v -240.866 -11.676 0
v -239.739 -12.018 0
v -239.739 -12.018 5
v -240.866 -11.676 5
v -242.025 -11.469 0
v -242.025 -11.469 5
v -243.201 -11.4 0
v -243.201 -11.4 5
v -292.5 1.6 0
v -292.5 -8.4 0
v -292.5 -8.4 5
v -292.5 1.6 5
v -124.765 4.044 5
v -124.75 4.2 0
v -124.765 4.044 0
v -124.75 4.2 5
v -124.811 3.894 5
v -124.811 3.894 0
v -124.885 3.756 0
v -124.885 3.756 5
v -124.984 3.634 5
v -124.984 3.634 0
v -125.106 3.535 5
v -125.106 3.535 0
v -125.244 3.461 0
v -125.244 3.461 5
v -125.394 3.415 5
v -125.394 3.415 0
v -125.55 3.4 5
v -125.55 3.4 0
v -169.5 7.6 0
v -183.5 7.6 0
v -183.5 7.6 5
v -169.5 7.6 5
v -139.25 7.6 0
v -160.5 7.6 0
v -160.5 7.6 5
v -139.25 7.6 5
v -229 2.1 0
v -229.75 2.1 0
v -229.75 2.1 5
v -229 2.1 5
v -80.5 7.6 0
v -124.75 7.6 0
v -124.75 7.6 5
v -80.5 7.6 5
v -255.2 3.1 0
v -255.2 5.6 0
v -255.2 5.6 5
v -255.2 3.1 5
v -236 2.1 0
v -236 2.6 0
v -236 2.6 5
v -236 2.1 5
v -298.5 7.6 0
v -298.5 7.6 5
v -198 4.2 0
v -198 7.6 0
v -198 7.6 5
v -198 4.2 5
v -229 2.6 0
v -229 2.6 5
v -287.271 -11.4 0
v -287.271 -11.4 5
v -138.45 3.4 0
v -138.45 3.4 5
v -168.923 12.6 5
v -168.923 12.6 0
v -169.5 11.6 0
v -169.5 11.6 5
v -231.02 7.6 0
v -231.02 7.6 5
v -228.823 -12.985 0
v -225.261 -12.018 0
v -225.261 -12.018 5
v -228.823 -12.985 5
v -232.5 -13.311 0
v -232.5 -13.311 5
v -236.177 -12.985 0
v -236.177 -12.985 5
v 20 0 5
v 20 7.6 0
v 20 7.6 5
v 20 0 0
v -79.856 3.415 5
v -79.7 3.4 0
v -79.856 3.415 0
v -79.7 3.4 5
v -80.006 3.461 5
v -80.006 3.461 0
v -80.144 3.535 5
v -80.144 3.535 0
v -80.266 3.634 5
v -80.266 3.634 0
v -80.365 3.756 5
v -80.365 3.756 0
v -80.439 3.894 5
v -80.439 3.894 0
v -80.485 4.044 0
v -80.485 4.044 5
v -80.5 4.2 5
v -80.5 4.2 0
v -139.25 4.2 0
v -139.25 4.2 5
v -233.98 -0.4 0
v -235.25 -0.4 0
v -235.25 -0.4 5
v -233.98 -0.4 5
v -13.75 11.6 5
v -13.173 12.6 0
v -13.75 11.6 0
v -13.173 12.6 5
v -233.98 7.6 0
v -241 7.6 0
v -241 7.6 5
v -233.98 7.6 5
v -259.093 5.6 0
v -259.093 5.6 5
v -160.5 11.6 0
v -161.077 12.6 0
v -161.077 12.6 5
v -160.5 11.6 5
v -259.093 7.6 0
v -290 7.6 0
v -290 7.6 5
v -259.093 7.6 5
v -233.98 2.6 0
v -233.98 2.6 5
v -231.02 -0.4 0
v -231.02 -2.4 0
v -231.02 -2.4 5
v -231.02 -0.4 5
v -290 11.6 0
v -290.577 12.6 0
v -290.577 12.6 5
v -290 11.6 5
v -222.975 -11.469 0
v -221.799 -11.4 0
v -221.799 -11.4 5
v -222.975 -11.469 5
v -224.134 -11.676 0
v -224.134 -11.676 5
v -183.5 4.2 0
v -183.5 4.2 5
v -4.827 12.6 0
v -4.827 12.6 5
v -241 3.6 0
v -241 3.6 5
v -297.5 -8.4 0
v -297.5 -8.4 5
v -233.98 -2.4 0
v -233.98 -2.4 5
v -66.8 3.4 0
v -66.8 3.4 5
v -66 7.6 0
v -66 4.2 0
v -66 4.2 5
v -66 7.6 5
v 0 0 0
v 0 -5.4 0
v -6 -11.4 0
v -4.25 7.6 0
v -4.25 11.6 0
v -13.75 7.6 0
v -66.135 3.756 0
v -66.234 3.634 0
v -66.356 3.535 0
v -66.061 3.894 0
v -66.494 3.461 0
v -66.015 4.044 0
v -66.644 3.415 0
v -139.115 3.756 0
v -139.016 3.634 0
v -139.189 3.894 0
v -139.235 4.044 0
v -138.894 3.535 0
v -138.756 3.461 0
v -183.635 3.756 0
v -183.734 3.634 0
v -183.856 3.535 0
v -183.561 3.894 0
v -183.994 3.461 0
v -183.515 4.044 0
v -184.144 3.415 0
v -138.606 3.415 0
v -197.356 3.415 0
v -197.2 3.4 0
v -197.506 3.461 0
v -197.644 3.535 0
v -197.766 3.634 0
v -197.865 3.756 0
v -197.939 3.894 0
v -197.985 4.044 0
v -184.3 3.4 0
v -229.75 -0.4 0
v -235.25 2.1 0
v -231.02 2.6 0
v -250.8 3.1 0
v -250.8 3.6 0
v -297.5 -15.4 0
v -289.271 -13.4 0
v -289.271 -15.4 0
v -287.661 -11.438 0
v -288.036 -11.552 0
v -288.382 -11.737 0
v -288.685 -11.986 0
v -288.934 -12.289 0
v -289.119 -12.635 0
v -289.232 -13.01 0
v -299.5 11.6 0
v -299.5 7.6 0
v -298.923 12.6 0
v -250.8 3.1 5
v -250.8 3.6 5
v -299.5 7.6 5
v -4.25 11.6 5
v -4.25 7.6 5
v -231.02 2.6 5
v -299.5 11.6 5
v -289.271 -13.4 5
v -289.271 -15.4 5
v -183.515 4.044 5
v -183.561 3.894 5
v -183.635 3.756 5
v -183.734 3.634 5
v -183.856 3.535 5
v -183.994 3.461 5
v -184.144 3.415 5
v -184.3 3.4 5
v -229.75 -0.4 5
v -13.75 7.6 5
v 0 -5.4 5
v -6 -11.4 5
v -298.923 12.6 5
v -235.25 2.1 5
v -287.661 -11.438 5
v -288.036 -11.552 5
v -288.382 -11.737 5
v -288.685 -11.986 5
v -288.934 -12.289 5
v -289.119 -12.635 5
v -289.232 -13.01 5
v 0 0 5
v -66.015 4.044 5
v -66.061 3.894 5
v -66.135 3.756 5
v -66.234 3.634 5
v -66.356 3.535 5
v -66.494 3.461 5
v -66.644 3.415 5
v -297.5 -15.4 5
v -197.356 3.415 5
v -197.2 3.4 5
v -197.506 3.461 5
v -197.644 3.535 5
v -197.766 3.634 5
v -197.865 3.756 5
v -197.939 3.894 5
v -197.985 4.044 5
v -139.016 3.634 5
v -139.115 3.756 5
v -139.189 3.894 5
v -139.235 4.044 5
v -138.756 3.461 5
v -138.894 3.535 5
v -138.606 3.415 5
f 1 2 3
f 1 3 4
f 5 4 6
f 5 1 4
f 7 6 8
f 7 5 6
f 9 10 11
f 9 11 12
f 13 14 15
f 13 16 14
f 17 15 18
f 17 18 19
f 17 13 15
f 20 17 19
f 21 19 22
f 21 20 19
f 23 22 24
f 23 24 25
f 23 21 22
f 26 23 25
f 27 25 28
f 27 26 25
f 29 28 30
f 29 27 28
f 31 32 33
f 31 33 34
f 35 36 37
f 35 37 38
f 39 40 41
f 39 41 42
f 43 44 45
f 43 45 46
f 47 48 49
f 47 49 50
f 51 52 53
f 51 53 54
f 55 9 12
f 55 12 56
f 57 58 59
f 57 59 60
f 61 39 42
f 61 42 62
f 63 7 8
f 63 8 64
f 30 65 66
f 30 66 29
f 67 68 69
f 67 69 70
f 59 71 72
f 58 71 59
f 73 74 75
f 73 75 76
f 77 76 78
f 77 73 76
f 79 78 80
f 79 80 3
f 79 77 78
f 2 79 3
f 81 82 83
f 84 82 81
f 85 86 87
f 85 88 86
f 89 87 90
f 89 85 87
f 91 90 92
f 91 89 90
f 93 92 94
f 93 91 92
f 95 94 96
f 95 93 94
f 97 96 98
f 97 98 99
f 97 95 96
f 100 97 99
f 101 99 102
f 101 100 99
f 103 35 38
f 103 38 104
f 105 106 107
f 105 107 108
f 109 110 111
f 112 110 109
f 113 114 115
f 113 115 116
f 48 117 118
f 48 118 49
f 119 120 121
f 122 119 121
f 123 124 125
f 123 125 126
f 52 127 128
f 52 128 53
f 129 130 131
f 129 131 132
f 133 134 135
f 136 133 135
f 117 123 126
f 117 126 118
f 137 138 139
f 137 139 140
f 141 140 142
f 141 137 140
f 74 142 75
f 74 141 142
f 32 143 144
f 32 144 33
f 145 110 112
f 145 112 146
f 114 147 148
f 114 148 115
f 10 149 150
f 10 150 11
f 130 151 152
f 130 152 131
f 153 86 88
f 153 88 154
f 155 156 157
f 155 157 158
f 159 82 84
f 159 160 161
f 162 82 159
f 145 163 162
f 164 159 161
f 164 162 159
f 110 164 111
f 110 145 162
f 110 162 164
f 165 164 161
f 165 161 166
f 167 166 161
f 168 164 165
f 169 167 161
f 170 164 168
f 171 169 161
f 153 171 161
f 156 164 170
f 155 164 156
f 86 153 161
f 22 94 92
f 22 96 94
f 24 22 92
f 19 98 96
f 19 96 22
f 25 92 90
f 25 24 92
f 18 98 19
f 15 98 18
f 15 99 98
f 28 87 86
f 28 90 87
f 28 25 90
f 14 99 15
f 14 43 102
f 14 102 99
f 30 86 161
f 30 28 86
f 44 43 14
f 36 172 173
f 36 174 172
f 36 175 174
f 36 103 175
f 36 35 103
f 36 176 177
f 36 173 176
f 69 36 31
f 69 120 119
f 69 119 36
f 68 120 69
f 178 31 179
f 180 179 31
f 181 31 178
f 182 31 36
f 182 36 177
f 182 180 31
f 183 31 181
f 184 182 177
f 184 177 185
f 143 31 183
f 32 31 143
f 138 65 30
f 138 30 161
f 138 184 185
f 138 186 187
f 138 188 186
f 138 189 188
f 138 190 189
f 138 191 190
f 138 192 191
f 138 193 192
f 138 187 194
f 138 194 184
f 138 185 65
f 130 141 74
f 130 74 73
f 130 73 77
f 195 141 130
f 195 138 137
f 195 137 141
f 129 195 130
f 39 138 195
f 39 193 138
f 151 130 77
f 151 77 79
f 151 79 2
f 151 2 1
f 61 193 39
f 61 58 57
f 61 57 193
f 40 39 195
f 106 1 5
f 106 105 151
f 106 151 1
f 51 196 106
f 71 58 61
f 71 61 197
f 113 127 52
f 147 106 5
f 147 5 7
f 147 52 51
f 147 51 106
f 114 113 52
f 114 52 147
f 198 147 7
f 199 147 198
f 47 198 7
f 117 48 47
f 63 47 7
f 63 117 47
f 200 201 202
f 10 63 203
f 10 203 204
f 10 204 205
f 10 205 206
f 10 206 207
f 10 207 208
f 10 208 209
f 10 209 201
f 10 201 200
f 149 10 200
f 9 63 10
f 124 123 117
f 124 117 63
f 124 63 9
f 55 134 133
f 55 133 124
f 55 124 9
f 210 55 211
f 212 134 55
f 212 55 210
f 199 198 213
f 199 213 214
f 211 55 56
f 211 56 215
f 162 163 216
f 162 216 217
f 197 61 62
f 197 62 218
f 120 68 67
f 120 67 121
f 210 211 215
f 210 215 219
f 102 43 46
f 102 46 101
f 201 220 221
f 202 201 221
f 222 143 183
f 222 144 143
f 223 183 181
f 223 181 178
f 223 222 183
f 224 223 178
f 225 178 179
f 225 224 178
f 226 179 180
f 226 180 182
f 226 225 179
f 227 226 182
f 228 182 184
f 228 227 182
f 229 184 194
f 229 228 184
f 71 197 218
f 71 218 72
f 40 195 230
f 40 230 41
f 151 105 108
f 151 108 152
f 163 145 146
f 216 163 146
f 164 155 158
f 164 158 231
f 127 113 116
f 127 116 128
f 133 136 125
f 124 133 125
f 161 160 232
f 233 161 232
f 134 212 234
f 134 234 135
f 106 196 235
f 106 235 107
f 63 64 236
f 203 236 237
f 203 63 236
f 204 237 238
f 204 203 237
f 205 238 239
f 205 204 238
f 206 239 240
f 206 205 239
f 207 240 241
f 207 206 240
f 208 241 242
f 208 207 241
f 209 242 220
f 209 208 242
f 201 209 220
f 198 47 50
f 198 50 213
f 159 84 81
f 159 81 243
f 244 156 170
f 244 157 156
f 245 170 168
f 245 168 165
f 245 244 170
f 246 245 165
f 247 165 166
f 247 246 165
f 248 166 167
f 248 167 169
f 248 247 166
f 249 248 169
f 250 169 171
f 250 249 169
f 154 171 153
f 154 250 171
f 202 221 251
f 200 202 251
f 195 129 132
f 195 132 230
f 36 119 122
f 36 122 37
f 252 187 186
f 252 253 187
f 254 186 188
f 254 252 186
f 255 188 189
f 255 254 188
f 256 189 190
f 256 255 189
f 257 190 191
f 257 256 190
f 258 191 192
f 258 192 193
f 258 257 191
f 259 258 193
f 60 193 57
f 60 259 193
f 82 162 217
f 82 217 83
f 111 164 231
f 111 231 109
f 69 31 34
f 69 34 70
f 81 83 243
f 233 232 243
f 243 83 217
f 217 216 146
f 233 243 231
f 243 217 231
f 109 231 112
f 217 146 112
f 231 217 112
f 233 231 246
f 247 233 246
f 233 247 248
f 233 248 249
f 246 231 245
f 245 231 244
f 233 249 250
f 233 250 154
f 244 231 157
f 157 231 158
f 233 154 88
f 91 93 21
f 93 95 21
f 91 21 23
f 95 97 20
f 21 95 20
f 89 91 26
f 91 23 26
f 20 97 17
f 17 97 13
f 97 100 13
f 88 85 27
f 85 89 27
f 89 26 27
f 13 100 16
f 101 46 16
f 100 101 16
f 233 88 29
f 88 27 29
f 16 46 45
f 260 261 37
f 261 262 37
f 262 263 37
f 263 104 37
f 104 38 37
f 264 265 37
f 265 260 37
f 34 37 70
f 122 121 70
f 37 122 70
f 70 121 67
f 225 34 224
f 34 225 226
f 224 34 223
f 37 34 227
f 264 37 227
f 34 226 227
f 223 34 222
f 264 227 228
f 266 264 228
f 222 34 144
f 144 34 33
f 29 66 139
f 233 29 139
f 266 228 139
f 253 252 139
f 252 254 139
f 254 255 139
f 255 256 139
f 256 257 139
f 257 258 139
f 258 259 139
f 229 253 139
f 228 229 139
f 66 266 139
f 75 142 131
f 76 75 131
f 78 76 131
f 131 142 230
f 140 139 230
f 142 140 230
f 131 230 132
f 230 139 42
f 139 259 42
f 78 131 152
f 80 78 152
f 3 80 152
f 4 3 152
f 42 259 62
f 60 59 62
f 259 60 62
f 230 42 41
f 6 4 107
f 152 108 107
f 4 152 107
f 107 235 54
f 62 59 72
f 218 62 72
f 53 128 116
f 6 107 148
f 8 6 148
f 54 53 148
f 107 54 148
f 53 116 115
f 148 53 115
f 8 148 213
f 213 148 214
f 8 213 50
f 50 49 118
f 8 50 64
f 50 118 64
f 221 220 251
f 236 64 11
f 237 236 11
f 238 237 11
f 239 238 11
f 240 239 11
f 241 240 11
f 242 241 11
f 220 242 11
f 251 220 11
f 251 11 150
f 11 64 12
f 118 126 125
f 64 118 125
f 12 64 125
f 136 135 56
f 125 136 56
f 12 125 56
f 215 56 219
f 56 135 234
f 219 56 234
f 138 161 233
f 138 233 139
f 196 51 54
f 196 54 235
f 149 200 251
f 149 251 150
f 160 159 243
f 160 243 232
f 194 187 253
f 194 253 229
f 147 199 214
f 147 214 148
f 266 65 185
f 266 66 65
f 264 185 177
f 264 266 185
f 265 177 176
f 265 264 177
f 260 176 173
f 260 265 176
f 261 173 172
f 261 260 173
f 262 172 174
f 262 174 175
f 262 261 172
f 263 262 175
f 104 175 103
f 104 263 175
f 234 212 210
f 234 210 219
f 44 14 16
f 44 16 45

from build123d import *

# Parameters (mm, degrees)
BOSS_EXTRUDE1_DEPTH   = 5
CHAMFER1_SIZE         = 6
CUT_EXTRUDE2_DEPTH    = 6
CHAMFER3_SIZE         = 1
CHAMFER3_SIZE2        = 0.577350269
CHAMFER3_PART_2_SIZE  = 1
CHAMFER3_PART_2_SIZE2 = 0.577350269
CHAMFER3_PART_3_SIZE  = 1
CHAMFER3_PART_3_SIZE2 = 0.577350269
CHAMFER4_SIZE         = 1
CHAMFER4_SIZE2        = 0.577350269
CHAMFER4_PART_2_SIZE  = 1
CHAMFER4_PART_2_SIZE2 = 0.577350269
CHAMFER4_PART_3_SIZE  = 1
CHAMFER4_PART_3_SIZE2 = 0.577350269
FILLET1_R             = 0.8


with BuildPart() as part:
    # Sketch1 → Boss-Extrude1 (new body)
    with BuildSketch(Plane.XY):
        with BuildLine():
            Line((-250.8, 3.6), (-241, 3.6))
            Line((-241, 3.6), (-241, 7.6))
            Line((-241, 7.6), (-233.98, 7.6))
            Line((-233.98, 7.6), (-233.98, 2.6))
            Line((-233.98, 2.6), (-236, 2.6))
            Line((-236, 2.6), (-236, 2.1))
            Line((-236, 2.1), (-235.25, 2.1))
            Line((-235.25, 2.1), (-235.25, -0.4))
            Line((-235.25, -0.4), (-233.98, -0.4))
            Line((-233.98, -0.4), (-233.98, -2.4))
            Line((-233.98, -2.4), (-231.02, -2.4))
            Line((-231.02, -2.4), (-231.02, -0.4))
            Line((-231.02, -0.4), (-229.75, -0.4))
            Line((-229.75, -0.4), (-229.75, 2.1))
            Line((-229.75, 2.1), (-229, 2.1))
            Line((-229, 2.1), (-229, 2.6))
            Line((-229, 2.6), (-231.02, 2.6))
            Line((-231.02, 2.6), (-231.02, 7.6))
            Line((-231.02, 7.6), (-198, 7.6))
            Line((-198, 7.6), (-198, 3.4))
            Line((-198, 3.4), (-183.5, 3.4))
            Line((-183.5, 3.4), (-183.5, 7.6))
            Line((-183.5, 7.6), (-169.5, 7.6))
            Line((-169.5, 7.6), (-169.5, 12.6))
            Line((-169.5, 12.6), (-160.5, 12.6))
            Line((-160.5, 12.6), (-160.5, 7.6))
            Line((-160.5, 7.6), (-139.25, 7.6))
            Line((-139.25, 7.6), (-139.25, 3.4))
            Line((-139.25, 3.4), (-124.75, 3.4))
            Line((-124.75, 3.4), (-124.75, 7.6))
            Line((-124.75, 7.6), (-80.5, 7.6))
            Line((-80.5, 7.6), (-80.5, 3.4))
            Line((-80.5, 3.4), (-66, 3.4))
            Line((-66, 3.4), (-66, 7.6))
            Line((-66, 7.6), (-13.75, 7.6))
            Line((-13.75, 7.6), (-13.75, 12.6))
            Line((-13.75, 12.6), (-4.25, 12.6))
            Line((-4.25, 12.6), (-4.25, 7.6))
            Line((-4.25, 7.6), (20, 7.6))
            Line((20, 7.6), (20, 0))
            Line((20, 0), (0, 0))
            Line((0, 0), (0, -11.4))
            Line((0, -11.4), (-221.799463771, -11.4))
            ThreePointArc((-221.799463771, -11.4), (-223.557706142, -11.555784248), (-225.261167219, -12.018283247))
            ThreePointArc((-225.261167219, -12.018283247), (-232.5, -13.3111869), (-239.738832781, -12.018283247))
            ThreePointArc((-239.738832781, -12.018283247), (-241.442293858, -11.555784248), (-243.200536229, -11.4))
            Line((-243.200536229, -11.4), (-287.270831989, -11.4))
            ThreePointArc((-287.270831989, -11.4), (-289.270831989, -13.4), (-287.270831989, -15.4))
            Line((-287.270831989, -15.4), (-282, -15.4))
            Line((-282, -15.4), (-282, -18.281197846))
            Line((-282, -18.281197846), (-283, -20.013248654))
            Line((-283, -20.013248654), (-286, -18.281197846))
            Line((-286, -18.281197846), (-290, -20.590598923))
            Line((-290, -20.590598923), (-290, -25.209401077))
            Line((-290, -25.209401077), (-286, -27.518802154))
            Line((-286, -27.518802154), (-283, -25.786751346))
            Line((-283, -25.786751346), (-282, -27.518802154))
            Line((-282, -27.518802154), (-282, -30.9))
            Line((-282, -30.9), (-297.5, -30.9))
            Line((-297.5, -30.9), (-297.5, -8.4))
            Line((-297.5, -8.4), (-292.5, -8.4))
            Line((-292.5, -8.4), (-292.5, 1.6))
            Line((-292.5, 1.6), (-298.5, 7.6))
            Line((-298.5, 7.6), (-299.5, 7.6))
            Line((-299.5, 7.6), (-299.5, 12.6))
            Line((-299.5, 12.6), (-290, 12.6))
            Line((-290, 12.6), (-290, 7.6))
            Line((-290, 7.6), (-259.093151184, 7.6))
            Line((-259.093151184, 7.6), (-259.093151184, 5.6))
            Line((-259.093151184, 5.6), (-255.2, 5.6))
            Line((-255.2, 5.6), (-255.2, 3.1))
            Line((-255.2, 3.1), (-250.8, 3.1))
            Line((-250.8, 3.1), (-250.8, 3.6))
        make_face()
    extrude(amount=BOSS_EXTRUDE1_DEPTH)

    # Chamfer1
    chamfer1_edges = [part.edges().sort_by_distance(p)[0] for p in [
        (0, -11.4, 2.5),
    ]]
    chamfer(chamfer1_edges, length=CHAMFER1_SIZE)

    # Sketch3 → Cut-Extrude2 (cut, through all)
    with BuildSketch(Plane.XY.offset(5)):
        Polygon((-289.270831989, -13.4), (-289.270831989, -15.4), (-297.5, -15.4), (-297.5, -30.9), (-282, -30.9), (-282, -13.4), align=None)
    extrude(amount=-CUT_EXTRUDE2_DEPTH, mode=Mode.SUBTRACT)

    # Chamfer3
    chamfer3_edges = [part.edges().sort_by_distance(p)[0] for p in [
        (-290, 12.6, 2.5),
    ]]
    chamfer3_side = [part.faces().sort_by_distance(p)[0] for p in [
        (-290, 10.1, 2.5),
    ]]
    chamfer(chamfer3_edges, length=CHAMFER3_SIZE, length2=CHAMFER3_SIZE2, reference=chamfer3_side[0])

    # Chamfer3 part 2
    chamfer3_part_2_edges = [part.edges().sort_by_distance(p)[0] for p in [
        (-160.5, 12.6, 2.5),
    ]]
    chamfer3_part_2_side = [part.faces().sort_by_distance(p)[0] for p in [
        (-160.5, 10.1, 2.5),
    ]]
    chamfer(chamfer3_part_2_edges, length=CHAMFER3_PART_2_SIZE, length2=CHAMFER3_PART_2_SIZE2, reference=chamfer3_part_2_side[0])

    # Chamfer3 part 3
    chamfer3_part_3_edges = [part.edges().sort_by_distance(p)[0] for p in [
        (-4.25, 12.6, 2.5),
    ]]
    chamfer3_part_3_side = [part.faces().sort_by_distance(p)[0] for p in [
        (-4.25, 10.1, 2.5),
    ]]
    chamfer(chamfer3_part_3_edges, length=CHAMFER3_PART_3_SIZE, length2=CHAMFER3_PART_3_SIZE2, reference=chamfer3_part_3_side[0])

    # Chamfer4
    chamfer4_edges = [part.edges().sort_by_distance(p)[0] for p in [
        (-299.5, 12.6, 2.5),
    ]]
    chamfer4_side = [part.faces().sort_by_distance(p)[0] for p in [
        (-299.5, 10.1, 2.5),
    ]]
    chamfer(chamfer4_edges, length=CHAMFER4_SIZE, length2=CHAMFER4_SIZE2, reference=chamfer4_side[0])

    # Chamfer4 part 2
    chamfer4_part_2_edges = [part.edges().sort_by_distance(p)[0] for p in [
        (-169.5, 12.6, 2.5),
    ]]
    chamfer4_part_2_side = [part.faces().sort_by_distance(p)[0] for p in [
        (-169.5, 10.1, 2.5),
    ]]
    chamfer(chamfer4_part_2_edges, length=CHAMFER4_PART_2_SIZE, length2=CHAMFER4_PART_2_SIZE2, reference=chamfer4_part_2_side[0])

    # Chamfer4 part 3
    chamfer4_part_3_edges = [part.edges().sort_by_distance(p)[0] for p in [
        (-13.75, 12.6, 2.5),
    ]]
    chamfer4_part_3_side = [part.faces().sort_by_distance(p)[0] for p in [
        (-13.75, 10.1, 2.5),
    ]]
    chamfer(chamfer4_part_3_edges, length=CHAMFER4_PART_3_SIZE, length2=CHAMFER4_PART_3_SIZE2, reference=chamfer4_part_3_side[0])

    # Fillet1
    fillet1_edges = [part.edges().sort_by_distance(p)[0] for p in [
        (-198, 3.4, 2.5),
        (-183.5, 3.4, 2.5),
        (-139.25, 3.4, 2.5),
        (-124.75, 3.4, 2.5),
        (-80.5, 3.4, 2.5),
        (-66, 3.4, 2.5),
    ]]
    fillet(fillet1_edges, radius=FILLET1_R)


solid = part.part
